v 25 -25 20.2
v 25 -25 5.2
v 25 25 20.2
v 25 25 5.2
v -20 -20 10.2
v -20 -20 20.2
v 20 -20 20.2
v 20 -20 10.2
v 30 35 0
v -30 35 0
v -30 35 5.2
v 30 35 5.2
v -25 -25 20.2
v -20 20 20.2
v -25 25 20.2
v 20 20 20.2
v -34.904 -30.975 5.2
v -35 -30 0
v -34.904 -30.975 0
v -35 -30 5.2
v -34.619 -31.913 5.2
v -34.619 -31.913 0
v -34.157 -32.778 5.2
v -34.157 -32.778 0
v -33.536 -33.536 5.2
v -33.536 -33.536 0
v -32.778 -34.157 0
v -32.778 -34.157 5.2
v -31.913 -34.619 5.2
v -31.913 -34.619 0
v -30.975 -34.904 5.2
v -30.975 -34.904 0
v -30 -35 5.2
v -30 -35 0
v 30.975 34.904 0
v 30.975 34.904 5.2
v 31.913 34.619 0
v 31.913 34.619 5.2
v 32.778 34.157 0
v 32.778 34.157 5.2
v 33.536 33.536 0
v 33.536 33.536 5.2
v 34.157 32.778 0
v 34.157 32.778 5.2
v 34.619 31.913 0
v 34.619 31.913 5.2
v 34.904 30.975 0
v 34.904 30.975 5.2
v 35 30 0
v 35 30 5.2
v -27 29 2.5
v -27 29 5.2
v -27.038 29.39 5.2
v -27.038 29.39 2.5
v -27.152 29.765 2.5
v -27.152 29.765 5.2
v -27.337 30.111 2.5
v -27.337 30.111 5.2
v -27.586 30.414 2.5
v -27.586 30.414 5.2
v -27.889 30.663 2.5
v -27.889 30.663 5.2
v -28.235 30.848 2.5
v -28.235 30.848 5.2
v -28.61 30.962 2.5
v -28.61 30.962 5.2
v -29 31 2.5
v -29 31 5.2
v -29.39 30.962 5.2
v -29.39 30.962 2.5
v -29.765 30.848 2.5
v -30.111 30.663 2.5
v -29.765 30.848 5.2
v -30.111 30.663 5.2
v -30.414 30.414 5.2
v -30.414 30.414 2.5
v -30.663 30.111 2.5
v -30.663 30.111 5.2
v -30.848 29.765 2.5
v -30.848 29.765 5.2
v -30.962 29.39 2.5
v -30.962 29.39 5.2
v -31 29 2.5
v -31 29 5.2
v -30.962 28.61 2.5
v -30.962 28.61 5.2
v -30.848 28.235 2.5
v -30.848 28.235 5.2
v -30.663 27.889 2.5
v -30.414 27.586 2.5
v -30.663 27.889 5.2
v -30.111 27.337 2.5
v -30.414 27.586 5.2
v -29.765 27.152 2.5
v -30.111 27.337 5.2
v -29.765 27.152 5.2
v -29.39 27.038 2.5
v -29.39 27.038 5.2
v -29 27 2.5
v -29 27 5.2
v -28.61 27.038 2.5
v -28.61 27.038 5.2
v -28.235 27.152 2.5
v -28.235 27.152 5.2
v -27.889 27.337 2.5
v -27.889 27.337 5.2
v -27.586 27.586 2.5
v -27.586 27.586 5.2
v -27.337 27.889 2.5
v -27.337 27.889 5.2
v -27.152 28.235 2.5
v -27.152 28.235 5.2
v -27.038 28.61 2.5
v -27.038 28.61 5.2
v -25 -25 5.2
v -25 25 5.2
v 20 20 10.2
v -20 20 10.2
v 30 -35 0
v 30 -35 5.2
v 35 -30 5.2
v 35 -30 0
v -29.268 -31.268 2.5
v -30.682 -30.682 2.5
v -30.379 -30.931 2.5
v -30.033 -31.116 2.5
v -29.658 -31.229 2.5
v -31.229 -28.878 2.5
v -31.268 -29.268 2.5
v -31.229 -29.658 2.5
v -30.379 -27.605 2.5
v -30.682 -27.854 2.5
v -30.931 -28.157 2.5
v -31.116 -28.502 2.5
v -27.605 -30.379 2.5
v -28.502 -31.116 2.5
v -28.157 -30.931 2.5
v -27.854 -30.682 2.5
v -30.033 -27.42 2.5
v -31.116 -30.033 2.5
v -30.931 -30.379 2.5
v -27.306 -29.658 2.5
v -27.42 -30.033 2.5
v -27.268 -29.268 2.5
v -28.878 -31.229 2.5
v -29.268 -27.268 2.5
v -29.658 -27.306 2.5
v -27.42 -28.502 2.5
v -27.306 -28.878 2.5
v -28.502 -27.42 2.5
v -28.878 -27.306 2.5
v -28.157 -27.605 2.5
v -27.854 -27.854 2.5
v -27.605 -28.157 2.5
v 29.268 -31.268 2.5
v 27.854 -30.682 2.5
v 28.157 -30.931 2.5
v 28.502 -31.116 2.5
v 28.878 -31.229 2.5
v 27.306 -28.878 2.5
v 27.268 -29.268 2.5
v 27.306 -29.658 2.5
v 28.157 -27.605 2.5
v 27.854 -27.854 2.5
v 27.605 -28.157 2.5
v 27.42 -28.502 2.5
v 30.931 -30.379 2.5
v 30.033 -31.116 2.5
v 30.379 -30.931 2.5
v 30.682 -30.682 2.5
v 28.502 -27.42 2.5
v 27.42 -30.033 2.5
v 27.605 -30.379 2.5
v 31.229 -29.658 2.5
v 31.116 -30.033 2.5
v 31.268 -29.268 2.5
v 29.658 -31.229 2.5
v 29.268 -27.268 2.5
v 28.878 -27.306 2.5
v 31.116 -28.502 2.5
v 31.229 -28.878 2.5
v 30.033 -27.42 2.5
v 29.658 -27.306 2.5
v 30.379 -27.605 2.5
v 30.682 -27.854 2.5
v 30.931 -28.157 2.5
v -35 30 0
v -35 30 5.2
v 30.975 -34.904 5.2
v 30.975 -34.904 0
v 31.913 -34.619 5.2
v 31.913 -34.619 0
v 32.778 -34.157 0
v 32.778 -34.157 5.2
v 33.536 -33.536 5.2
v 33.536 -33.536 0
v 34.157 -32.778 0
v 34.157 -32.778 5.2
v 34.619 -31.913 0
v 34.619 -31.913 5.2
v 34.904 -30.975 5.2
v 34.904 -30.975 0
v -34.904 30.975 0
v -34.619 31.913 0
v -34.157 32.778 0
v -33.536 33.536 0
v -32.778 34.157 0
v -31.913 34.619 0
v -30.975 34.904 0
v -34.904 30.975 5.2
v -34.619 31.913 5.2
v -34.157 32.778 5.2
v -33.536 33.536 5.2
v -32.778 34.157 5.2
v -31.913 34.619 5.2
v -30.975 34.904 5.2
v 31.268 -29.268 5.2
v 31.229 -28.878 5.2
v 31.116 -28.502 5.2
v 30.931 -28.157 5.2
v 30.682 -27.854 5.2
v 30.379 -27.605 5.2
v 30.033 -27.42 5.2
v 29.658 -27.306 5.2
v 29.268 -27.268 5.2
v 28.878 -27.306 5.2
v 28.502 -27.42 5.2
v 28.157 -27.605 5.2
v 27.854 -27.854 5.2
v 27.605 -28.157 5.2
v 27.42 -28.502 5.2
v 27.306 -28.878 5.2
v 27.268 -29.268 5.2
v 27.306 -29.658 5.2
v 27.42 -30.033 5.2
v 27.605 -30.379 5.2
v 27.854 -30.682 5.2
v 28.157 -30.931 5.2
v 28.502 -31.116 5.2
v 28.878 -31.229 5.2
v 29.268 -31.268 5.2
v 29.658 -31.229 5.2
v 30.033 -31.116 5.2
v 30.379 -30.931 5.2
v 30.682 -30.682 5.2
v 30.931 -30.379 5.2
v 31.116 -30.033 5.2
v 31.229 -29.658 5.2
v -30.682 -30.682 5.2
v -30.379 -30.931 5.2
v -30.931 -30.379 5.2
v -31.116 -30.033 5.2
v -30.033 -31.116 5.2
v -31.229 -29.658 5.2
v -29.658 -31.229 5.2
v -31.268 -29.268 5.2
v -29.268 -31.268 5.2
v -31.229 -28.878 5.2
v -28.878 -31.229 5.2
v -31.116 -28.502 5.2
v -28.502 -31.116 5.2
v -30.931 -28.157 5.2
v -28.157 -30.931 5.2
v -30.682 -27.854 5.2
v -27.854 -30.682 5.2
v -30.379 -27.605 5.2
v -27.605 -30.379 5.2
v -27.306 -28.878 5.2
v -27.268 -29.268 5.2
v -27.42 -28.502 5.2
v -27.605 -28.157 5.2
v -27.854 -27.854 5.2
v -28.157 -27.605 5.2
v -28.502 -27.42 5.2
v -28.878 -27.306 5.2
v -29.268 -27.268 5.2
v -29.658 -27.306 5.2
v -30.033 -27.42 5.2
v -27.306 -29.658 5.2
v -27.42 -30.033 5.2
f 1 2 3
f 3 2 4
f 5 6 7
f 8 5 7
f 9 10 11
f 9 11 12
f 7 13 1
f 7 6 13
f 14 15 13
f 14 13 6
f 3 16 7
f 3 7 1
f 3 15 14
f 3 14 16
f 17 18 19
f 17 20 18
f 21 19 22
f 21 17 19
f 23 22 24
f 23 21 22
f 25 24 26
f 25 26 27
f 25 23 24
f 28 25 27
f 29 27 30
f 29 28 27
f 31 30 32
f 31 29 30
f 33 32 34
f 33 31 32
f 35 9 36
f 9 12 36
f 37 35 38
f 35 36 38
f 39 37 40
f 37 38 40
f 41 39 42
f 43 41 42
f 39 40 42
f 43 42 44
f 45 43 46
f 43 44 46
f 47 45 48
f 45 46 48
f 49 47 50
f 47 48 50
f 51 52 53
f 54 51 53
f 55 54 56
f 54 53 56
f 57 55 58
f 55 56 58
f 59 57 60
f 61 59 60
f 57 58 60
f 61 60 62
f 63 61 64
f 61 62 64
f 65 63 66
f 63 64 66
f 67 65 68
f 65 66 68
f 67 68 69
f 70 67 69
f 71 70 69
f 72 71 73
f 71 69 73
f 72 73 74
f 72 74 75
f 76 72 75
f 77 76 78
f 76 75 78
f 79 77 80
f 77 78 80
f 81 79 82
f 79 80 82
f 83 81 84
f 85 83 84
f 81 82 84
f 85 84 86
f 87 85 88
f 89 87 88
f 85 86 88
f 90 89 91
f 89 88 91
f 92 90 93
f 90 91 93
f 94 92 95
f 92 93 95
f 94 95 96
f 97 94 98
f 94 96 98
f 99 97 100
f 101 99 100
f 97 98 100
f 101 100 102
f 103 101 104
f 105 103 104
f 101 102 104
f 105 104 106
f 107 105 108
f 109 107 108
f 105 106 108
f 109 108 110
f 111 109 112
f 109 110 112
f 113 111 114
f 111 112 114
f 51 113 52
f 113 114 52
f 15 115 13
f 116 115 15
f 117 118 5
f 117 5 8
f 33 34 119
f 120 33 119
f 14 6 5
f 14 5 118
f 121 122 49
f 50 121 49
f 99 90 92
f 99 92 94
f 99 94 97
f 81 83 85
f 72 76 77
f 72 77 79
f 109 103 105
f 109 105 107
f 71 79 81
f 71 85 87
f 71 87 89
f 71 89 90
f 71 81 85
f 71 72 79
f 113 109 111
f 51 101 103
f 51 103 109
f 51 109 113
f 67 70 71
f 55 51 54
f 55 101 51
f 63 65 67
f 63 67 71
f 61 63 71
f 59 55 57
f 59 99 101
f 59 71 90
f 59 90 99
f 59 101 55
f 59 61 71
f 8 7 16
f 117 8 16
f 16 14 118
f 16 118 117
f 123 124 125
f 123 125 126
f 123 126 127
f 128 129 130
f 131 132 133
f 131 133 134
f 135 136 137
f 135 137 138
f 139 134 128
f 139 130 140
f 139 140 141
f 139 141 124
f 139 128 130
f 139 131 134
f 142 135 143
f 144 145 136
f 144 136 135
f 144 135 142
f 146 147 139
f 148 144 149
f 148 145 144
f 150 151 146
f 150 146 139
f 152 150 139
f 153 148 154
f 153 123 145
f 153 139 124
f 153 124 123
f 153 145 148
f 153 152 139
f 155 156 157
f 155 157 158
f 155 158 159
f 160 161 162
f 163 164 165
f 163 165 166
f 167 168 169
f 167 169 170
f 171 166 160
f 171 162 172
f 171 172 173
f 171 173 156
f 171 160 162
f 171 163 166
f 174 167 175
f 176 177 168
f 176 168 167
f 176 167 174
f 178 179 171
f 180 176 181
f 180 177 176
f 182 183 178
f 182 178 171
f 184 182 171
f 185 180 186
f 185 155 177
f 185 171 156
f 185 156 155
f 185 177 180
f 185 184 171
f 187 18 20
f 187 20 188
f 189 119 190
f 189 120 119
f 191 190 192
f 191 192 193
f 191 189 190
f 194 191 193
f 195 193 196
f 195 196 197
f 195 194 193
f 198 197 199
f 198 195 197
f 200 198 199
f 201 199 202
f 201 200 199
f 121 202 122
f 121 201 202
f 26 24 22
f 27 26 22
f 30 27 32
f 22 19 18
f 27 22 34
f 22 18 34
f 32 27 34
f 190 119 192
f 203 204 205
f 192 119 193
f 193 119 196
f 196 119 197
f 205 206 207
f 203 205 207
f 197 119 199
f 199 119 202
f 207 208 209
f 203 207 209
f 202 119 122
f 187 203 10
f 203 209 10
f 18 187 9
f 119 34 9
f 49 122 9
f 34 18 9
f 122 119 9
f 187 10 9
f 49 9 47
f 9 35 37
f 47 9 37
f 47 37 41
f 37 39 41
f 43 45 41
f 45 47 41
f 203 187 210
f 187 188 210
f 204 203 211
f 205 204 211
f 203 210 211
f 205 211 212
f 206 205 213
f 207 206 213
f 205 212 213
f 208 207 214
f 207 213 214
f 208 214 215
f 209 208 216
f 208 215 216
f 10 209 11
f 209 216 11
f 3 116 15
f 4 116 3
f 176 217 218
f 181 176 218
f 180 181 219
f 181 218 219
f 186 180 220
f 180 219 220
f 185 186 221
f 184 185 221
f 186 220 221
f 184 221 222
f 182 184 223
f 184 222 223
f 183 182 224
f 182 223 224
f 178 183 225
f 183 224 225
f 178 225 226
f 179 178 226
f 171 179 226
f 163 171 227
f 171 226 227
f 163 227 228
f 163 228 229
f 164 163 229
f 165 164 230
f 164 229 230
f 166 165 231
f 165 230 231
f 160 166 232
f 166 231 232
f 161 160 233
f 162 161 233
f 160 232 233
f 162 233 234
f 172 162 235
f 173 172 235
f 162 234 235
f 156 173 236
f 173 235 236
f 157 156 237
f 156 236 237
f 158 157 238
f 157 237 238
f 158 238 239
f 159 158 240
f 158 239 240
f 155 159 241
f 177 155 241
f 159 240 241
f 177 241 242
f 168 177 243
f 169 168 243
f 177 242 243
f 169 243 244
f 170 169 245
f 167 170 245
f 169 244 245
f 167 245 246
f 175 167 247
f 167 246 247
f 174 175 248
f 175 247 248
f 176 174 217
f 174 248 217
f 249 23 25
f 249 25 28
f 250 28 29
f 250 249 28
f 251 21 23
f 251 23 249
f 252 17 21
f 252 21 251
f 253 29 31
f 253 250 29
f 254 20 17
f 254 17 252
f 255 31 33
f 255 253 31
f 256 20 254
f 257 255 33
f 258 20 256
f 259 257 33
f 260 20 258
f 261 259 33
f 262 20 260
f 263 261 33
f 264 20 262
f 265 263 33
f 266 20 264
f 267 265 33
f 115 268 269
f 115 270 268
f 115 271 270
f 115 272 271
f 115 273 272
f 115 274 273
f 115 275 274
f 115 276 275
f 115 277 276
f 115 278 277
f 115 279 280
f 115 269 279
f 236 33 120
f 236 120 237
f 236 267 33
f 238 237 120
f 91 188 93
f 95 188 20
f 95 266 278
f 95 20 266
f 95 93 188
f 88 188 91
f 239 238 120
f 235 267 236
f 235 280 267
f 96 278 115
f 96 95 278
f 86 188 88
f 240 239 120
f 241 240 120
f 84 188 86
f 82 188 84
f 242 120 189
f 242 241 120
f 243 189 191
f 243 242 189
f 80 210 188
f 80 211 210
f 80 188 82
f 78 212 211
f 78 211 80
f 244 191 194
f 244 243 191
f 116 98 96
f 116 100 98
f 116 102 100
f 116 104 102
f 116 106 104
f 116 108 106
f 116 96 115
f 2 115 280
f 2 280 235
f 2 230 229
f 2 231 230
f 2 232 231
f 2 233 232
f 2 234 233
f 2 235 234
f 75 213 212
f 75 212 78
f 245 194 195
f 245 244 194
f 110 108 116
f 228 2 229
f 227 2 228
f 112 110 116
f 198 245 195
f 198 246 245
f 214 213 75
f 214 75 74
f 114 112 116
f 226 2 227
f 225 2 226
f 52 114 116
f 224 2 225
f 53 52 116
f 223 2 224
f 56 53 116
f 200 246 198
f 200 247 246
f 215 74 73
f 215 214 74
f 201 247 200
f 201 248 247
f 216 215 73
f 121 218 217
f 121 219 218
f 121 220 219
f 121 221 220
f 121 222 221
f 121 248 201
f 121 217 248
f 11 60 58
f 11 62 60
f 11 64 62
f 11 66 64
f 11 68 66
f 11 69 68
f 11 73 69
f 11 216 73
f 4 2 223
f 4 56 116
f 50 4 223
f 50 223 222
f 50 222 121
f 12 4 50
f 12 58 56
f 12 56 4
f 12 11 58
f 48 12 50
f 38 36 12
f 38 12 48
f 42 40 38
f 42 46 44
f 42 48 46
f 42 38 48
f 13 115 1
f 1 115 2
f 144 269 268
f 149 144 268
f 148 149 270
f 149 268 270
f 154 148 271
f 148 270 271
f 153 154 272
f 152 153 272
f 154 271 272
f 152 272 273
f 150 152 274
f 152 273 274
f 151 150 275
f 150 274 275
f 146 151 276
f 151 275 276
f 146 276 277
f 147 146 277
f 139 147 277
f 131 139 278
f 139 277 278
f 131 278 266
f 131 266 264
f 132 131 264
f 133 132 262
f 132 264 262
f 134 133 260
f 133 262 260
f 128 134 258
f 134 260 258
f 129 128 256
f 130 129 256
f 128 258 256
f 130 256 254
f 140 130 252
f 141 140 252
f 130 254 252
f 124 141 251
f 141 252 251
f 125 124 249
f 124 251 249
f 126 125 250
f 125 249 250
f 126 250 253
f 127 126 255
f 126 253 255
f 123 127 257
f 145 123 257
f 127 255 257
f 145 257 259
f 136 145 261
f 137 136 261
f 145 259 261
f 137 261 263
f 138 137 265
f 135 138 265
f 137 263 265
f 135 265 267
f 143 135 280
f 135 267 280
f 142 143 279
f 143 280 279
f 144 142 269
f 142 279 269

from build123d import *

# Parameters (mm, degrees)
F0_W     = 70
F0_H     = 70
F1_DEPTH = 5.2
F2_W     = 50
F2_H     = 50
F3_DEPTH = 15
F4_R     = 5
F5_R     = 2
F6_DEPTH = 2.7
F8_W     = 40
F8_H     = 40
F9_DEPTH = 10


# Not quite as in the source:
# - a feature names something its author has since deleted; it is built from what else it names


with BuildPart() as f1:
    # F0 (on Top) → F1 (new body)
    with BuildSketch(Plane.XY):
        Rectangle(F0_W, F0_H)
    extrude(amount=F1_DEPTH)

    # F2 (on face) → F3 (join)
    with BuildSketch(Plane.XY.offset(5.2)):
        Rectangle(F2_W, F2_H)
    extrude(amount=F3_DEPTH)

    # F4
    f4_edges = [f1.edges().sort_by_distance(p)[0] for p in [
        (-35, 35, 2.6),
        (35, 35, 2.6),
        (35, -35, 2.6),
        (-35, -35, 2.6),
    ]]
    fillet(f4_edges, radius=F4_R)

    # F5 (on face) → F6 (cut)
    with BuildSketch(Plane.XY.offset(5.2)):
        with Locations((-29, 29)):
            Circle(F5_R)
        with Locations((29.267766953, -29.267766953)):
            Circle(F5_R)
        with Locations((-29.267766953, -29.267766953)):
            Circle(F5_R)
    extrude(amount=-F6_DEPTH, mode=Mode.SUBTRACT)

    # F8 (on face) → F9 (cut)
    with BuildSketch(Plane.XY.offset(20.2)):
        Rectangle(F8_W, F8_H)
    extrude(amount=-F9_DEPTH, mode=Mode.SUBTRACT)


solid = f1.part
